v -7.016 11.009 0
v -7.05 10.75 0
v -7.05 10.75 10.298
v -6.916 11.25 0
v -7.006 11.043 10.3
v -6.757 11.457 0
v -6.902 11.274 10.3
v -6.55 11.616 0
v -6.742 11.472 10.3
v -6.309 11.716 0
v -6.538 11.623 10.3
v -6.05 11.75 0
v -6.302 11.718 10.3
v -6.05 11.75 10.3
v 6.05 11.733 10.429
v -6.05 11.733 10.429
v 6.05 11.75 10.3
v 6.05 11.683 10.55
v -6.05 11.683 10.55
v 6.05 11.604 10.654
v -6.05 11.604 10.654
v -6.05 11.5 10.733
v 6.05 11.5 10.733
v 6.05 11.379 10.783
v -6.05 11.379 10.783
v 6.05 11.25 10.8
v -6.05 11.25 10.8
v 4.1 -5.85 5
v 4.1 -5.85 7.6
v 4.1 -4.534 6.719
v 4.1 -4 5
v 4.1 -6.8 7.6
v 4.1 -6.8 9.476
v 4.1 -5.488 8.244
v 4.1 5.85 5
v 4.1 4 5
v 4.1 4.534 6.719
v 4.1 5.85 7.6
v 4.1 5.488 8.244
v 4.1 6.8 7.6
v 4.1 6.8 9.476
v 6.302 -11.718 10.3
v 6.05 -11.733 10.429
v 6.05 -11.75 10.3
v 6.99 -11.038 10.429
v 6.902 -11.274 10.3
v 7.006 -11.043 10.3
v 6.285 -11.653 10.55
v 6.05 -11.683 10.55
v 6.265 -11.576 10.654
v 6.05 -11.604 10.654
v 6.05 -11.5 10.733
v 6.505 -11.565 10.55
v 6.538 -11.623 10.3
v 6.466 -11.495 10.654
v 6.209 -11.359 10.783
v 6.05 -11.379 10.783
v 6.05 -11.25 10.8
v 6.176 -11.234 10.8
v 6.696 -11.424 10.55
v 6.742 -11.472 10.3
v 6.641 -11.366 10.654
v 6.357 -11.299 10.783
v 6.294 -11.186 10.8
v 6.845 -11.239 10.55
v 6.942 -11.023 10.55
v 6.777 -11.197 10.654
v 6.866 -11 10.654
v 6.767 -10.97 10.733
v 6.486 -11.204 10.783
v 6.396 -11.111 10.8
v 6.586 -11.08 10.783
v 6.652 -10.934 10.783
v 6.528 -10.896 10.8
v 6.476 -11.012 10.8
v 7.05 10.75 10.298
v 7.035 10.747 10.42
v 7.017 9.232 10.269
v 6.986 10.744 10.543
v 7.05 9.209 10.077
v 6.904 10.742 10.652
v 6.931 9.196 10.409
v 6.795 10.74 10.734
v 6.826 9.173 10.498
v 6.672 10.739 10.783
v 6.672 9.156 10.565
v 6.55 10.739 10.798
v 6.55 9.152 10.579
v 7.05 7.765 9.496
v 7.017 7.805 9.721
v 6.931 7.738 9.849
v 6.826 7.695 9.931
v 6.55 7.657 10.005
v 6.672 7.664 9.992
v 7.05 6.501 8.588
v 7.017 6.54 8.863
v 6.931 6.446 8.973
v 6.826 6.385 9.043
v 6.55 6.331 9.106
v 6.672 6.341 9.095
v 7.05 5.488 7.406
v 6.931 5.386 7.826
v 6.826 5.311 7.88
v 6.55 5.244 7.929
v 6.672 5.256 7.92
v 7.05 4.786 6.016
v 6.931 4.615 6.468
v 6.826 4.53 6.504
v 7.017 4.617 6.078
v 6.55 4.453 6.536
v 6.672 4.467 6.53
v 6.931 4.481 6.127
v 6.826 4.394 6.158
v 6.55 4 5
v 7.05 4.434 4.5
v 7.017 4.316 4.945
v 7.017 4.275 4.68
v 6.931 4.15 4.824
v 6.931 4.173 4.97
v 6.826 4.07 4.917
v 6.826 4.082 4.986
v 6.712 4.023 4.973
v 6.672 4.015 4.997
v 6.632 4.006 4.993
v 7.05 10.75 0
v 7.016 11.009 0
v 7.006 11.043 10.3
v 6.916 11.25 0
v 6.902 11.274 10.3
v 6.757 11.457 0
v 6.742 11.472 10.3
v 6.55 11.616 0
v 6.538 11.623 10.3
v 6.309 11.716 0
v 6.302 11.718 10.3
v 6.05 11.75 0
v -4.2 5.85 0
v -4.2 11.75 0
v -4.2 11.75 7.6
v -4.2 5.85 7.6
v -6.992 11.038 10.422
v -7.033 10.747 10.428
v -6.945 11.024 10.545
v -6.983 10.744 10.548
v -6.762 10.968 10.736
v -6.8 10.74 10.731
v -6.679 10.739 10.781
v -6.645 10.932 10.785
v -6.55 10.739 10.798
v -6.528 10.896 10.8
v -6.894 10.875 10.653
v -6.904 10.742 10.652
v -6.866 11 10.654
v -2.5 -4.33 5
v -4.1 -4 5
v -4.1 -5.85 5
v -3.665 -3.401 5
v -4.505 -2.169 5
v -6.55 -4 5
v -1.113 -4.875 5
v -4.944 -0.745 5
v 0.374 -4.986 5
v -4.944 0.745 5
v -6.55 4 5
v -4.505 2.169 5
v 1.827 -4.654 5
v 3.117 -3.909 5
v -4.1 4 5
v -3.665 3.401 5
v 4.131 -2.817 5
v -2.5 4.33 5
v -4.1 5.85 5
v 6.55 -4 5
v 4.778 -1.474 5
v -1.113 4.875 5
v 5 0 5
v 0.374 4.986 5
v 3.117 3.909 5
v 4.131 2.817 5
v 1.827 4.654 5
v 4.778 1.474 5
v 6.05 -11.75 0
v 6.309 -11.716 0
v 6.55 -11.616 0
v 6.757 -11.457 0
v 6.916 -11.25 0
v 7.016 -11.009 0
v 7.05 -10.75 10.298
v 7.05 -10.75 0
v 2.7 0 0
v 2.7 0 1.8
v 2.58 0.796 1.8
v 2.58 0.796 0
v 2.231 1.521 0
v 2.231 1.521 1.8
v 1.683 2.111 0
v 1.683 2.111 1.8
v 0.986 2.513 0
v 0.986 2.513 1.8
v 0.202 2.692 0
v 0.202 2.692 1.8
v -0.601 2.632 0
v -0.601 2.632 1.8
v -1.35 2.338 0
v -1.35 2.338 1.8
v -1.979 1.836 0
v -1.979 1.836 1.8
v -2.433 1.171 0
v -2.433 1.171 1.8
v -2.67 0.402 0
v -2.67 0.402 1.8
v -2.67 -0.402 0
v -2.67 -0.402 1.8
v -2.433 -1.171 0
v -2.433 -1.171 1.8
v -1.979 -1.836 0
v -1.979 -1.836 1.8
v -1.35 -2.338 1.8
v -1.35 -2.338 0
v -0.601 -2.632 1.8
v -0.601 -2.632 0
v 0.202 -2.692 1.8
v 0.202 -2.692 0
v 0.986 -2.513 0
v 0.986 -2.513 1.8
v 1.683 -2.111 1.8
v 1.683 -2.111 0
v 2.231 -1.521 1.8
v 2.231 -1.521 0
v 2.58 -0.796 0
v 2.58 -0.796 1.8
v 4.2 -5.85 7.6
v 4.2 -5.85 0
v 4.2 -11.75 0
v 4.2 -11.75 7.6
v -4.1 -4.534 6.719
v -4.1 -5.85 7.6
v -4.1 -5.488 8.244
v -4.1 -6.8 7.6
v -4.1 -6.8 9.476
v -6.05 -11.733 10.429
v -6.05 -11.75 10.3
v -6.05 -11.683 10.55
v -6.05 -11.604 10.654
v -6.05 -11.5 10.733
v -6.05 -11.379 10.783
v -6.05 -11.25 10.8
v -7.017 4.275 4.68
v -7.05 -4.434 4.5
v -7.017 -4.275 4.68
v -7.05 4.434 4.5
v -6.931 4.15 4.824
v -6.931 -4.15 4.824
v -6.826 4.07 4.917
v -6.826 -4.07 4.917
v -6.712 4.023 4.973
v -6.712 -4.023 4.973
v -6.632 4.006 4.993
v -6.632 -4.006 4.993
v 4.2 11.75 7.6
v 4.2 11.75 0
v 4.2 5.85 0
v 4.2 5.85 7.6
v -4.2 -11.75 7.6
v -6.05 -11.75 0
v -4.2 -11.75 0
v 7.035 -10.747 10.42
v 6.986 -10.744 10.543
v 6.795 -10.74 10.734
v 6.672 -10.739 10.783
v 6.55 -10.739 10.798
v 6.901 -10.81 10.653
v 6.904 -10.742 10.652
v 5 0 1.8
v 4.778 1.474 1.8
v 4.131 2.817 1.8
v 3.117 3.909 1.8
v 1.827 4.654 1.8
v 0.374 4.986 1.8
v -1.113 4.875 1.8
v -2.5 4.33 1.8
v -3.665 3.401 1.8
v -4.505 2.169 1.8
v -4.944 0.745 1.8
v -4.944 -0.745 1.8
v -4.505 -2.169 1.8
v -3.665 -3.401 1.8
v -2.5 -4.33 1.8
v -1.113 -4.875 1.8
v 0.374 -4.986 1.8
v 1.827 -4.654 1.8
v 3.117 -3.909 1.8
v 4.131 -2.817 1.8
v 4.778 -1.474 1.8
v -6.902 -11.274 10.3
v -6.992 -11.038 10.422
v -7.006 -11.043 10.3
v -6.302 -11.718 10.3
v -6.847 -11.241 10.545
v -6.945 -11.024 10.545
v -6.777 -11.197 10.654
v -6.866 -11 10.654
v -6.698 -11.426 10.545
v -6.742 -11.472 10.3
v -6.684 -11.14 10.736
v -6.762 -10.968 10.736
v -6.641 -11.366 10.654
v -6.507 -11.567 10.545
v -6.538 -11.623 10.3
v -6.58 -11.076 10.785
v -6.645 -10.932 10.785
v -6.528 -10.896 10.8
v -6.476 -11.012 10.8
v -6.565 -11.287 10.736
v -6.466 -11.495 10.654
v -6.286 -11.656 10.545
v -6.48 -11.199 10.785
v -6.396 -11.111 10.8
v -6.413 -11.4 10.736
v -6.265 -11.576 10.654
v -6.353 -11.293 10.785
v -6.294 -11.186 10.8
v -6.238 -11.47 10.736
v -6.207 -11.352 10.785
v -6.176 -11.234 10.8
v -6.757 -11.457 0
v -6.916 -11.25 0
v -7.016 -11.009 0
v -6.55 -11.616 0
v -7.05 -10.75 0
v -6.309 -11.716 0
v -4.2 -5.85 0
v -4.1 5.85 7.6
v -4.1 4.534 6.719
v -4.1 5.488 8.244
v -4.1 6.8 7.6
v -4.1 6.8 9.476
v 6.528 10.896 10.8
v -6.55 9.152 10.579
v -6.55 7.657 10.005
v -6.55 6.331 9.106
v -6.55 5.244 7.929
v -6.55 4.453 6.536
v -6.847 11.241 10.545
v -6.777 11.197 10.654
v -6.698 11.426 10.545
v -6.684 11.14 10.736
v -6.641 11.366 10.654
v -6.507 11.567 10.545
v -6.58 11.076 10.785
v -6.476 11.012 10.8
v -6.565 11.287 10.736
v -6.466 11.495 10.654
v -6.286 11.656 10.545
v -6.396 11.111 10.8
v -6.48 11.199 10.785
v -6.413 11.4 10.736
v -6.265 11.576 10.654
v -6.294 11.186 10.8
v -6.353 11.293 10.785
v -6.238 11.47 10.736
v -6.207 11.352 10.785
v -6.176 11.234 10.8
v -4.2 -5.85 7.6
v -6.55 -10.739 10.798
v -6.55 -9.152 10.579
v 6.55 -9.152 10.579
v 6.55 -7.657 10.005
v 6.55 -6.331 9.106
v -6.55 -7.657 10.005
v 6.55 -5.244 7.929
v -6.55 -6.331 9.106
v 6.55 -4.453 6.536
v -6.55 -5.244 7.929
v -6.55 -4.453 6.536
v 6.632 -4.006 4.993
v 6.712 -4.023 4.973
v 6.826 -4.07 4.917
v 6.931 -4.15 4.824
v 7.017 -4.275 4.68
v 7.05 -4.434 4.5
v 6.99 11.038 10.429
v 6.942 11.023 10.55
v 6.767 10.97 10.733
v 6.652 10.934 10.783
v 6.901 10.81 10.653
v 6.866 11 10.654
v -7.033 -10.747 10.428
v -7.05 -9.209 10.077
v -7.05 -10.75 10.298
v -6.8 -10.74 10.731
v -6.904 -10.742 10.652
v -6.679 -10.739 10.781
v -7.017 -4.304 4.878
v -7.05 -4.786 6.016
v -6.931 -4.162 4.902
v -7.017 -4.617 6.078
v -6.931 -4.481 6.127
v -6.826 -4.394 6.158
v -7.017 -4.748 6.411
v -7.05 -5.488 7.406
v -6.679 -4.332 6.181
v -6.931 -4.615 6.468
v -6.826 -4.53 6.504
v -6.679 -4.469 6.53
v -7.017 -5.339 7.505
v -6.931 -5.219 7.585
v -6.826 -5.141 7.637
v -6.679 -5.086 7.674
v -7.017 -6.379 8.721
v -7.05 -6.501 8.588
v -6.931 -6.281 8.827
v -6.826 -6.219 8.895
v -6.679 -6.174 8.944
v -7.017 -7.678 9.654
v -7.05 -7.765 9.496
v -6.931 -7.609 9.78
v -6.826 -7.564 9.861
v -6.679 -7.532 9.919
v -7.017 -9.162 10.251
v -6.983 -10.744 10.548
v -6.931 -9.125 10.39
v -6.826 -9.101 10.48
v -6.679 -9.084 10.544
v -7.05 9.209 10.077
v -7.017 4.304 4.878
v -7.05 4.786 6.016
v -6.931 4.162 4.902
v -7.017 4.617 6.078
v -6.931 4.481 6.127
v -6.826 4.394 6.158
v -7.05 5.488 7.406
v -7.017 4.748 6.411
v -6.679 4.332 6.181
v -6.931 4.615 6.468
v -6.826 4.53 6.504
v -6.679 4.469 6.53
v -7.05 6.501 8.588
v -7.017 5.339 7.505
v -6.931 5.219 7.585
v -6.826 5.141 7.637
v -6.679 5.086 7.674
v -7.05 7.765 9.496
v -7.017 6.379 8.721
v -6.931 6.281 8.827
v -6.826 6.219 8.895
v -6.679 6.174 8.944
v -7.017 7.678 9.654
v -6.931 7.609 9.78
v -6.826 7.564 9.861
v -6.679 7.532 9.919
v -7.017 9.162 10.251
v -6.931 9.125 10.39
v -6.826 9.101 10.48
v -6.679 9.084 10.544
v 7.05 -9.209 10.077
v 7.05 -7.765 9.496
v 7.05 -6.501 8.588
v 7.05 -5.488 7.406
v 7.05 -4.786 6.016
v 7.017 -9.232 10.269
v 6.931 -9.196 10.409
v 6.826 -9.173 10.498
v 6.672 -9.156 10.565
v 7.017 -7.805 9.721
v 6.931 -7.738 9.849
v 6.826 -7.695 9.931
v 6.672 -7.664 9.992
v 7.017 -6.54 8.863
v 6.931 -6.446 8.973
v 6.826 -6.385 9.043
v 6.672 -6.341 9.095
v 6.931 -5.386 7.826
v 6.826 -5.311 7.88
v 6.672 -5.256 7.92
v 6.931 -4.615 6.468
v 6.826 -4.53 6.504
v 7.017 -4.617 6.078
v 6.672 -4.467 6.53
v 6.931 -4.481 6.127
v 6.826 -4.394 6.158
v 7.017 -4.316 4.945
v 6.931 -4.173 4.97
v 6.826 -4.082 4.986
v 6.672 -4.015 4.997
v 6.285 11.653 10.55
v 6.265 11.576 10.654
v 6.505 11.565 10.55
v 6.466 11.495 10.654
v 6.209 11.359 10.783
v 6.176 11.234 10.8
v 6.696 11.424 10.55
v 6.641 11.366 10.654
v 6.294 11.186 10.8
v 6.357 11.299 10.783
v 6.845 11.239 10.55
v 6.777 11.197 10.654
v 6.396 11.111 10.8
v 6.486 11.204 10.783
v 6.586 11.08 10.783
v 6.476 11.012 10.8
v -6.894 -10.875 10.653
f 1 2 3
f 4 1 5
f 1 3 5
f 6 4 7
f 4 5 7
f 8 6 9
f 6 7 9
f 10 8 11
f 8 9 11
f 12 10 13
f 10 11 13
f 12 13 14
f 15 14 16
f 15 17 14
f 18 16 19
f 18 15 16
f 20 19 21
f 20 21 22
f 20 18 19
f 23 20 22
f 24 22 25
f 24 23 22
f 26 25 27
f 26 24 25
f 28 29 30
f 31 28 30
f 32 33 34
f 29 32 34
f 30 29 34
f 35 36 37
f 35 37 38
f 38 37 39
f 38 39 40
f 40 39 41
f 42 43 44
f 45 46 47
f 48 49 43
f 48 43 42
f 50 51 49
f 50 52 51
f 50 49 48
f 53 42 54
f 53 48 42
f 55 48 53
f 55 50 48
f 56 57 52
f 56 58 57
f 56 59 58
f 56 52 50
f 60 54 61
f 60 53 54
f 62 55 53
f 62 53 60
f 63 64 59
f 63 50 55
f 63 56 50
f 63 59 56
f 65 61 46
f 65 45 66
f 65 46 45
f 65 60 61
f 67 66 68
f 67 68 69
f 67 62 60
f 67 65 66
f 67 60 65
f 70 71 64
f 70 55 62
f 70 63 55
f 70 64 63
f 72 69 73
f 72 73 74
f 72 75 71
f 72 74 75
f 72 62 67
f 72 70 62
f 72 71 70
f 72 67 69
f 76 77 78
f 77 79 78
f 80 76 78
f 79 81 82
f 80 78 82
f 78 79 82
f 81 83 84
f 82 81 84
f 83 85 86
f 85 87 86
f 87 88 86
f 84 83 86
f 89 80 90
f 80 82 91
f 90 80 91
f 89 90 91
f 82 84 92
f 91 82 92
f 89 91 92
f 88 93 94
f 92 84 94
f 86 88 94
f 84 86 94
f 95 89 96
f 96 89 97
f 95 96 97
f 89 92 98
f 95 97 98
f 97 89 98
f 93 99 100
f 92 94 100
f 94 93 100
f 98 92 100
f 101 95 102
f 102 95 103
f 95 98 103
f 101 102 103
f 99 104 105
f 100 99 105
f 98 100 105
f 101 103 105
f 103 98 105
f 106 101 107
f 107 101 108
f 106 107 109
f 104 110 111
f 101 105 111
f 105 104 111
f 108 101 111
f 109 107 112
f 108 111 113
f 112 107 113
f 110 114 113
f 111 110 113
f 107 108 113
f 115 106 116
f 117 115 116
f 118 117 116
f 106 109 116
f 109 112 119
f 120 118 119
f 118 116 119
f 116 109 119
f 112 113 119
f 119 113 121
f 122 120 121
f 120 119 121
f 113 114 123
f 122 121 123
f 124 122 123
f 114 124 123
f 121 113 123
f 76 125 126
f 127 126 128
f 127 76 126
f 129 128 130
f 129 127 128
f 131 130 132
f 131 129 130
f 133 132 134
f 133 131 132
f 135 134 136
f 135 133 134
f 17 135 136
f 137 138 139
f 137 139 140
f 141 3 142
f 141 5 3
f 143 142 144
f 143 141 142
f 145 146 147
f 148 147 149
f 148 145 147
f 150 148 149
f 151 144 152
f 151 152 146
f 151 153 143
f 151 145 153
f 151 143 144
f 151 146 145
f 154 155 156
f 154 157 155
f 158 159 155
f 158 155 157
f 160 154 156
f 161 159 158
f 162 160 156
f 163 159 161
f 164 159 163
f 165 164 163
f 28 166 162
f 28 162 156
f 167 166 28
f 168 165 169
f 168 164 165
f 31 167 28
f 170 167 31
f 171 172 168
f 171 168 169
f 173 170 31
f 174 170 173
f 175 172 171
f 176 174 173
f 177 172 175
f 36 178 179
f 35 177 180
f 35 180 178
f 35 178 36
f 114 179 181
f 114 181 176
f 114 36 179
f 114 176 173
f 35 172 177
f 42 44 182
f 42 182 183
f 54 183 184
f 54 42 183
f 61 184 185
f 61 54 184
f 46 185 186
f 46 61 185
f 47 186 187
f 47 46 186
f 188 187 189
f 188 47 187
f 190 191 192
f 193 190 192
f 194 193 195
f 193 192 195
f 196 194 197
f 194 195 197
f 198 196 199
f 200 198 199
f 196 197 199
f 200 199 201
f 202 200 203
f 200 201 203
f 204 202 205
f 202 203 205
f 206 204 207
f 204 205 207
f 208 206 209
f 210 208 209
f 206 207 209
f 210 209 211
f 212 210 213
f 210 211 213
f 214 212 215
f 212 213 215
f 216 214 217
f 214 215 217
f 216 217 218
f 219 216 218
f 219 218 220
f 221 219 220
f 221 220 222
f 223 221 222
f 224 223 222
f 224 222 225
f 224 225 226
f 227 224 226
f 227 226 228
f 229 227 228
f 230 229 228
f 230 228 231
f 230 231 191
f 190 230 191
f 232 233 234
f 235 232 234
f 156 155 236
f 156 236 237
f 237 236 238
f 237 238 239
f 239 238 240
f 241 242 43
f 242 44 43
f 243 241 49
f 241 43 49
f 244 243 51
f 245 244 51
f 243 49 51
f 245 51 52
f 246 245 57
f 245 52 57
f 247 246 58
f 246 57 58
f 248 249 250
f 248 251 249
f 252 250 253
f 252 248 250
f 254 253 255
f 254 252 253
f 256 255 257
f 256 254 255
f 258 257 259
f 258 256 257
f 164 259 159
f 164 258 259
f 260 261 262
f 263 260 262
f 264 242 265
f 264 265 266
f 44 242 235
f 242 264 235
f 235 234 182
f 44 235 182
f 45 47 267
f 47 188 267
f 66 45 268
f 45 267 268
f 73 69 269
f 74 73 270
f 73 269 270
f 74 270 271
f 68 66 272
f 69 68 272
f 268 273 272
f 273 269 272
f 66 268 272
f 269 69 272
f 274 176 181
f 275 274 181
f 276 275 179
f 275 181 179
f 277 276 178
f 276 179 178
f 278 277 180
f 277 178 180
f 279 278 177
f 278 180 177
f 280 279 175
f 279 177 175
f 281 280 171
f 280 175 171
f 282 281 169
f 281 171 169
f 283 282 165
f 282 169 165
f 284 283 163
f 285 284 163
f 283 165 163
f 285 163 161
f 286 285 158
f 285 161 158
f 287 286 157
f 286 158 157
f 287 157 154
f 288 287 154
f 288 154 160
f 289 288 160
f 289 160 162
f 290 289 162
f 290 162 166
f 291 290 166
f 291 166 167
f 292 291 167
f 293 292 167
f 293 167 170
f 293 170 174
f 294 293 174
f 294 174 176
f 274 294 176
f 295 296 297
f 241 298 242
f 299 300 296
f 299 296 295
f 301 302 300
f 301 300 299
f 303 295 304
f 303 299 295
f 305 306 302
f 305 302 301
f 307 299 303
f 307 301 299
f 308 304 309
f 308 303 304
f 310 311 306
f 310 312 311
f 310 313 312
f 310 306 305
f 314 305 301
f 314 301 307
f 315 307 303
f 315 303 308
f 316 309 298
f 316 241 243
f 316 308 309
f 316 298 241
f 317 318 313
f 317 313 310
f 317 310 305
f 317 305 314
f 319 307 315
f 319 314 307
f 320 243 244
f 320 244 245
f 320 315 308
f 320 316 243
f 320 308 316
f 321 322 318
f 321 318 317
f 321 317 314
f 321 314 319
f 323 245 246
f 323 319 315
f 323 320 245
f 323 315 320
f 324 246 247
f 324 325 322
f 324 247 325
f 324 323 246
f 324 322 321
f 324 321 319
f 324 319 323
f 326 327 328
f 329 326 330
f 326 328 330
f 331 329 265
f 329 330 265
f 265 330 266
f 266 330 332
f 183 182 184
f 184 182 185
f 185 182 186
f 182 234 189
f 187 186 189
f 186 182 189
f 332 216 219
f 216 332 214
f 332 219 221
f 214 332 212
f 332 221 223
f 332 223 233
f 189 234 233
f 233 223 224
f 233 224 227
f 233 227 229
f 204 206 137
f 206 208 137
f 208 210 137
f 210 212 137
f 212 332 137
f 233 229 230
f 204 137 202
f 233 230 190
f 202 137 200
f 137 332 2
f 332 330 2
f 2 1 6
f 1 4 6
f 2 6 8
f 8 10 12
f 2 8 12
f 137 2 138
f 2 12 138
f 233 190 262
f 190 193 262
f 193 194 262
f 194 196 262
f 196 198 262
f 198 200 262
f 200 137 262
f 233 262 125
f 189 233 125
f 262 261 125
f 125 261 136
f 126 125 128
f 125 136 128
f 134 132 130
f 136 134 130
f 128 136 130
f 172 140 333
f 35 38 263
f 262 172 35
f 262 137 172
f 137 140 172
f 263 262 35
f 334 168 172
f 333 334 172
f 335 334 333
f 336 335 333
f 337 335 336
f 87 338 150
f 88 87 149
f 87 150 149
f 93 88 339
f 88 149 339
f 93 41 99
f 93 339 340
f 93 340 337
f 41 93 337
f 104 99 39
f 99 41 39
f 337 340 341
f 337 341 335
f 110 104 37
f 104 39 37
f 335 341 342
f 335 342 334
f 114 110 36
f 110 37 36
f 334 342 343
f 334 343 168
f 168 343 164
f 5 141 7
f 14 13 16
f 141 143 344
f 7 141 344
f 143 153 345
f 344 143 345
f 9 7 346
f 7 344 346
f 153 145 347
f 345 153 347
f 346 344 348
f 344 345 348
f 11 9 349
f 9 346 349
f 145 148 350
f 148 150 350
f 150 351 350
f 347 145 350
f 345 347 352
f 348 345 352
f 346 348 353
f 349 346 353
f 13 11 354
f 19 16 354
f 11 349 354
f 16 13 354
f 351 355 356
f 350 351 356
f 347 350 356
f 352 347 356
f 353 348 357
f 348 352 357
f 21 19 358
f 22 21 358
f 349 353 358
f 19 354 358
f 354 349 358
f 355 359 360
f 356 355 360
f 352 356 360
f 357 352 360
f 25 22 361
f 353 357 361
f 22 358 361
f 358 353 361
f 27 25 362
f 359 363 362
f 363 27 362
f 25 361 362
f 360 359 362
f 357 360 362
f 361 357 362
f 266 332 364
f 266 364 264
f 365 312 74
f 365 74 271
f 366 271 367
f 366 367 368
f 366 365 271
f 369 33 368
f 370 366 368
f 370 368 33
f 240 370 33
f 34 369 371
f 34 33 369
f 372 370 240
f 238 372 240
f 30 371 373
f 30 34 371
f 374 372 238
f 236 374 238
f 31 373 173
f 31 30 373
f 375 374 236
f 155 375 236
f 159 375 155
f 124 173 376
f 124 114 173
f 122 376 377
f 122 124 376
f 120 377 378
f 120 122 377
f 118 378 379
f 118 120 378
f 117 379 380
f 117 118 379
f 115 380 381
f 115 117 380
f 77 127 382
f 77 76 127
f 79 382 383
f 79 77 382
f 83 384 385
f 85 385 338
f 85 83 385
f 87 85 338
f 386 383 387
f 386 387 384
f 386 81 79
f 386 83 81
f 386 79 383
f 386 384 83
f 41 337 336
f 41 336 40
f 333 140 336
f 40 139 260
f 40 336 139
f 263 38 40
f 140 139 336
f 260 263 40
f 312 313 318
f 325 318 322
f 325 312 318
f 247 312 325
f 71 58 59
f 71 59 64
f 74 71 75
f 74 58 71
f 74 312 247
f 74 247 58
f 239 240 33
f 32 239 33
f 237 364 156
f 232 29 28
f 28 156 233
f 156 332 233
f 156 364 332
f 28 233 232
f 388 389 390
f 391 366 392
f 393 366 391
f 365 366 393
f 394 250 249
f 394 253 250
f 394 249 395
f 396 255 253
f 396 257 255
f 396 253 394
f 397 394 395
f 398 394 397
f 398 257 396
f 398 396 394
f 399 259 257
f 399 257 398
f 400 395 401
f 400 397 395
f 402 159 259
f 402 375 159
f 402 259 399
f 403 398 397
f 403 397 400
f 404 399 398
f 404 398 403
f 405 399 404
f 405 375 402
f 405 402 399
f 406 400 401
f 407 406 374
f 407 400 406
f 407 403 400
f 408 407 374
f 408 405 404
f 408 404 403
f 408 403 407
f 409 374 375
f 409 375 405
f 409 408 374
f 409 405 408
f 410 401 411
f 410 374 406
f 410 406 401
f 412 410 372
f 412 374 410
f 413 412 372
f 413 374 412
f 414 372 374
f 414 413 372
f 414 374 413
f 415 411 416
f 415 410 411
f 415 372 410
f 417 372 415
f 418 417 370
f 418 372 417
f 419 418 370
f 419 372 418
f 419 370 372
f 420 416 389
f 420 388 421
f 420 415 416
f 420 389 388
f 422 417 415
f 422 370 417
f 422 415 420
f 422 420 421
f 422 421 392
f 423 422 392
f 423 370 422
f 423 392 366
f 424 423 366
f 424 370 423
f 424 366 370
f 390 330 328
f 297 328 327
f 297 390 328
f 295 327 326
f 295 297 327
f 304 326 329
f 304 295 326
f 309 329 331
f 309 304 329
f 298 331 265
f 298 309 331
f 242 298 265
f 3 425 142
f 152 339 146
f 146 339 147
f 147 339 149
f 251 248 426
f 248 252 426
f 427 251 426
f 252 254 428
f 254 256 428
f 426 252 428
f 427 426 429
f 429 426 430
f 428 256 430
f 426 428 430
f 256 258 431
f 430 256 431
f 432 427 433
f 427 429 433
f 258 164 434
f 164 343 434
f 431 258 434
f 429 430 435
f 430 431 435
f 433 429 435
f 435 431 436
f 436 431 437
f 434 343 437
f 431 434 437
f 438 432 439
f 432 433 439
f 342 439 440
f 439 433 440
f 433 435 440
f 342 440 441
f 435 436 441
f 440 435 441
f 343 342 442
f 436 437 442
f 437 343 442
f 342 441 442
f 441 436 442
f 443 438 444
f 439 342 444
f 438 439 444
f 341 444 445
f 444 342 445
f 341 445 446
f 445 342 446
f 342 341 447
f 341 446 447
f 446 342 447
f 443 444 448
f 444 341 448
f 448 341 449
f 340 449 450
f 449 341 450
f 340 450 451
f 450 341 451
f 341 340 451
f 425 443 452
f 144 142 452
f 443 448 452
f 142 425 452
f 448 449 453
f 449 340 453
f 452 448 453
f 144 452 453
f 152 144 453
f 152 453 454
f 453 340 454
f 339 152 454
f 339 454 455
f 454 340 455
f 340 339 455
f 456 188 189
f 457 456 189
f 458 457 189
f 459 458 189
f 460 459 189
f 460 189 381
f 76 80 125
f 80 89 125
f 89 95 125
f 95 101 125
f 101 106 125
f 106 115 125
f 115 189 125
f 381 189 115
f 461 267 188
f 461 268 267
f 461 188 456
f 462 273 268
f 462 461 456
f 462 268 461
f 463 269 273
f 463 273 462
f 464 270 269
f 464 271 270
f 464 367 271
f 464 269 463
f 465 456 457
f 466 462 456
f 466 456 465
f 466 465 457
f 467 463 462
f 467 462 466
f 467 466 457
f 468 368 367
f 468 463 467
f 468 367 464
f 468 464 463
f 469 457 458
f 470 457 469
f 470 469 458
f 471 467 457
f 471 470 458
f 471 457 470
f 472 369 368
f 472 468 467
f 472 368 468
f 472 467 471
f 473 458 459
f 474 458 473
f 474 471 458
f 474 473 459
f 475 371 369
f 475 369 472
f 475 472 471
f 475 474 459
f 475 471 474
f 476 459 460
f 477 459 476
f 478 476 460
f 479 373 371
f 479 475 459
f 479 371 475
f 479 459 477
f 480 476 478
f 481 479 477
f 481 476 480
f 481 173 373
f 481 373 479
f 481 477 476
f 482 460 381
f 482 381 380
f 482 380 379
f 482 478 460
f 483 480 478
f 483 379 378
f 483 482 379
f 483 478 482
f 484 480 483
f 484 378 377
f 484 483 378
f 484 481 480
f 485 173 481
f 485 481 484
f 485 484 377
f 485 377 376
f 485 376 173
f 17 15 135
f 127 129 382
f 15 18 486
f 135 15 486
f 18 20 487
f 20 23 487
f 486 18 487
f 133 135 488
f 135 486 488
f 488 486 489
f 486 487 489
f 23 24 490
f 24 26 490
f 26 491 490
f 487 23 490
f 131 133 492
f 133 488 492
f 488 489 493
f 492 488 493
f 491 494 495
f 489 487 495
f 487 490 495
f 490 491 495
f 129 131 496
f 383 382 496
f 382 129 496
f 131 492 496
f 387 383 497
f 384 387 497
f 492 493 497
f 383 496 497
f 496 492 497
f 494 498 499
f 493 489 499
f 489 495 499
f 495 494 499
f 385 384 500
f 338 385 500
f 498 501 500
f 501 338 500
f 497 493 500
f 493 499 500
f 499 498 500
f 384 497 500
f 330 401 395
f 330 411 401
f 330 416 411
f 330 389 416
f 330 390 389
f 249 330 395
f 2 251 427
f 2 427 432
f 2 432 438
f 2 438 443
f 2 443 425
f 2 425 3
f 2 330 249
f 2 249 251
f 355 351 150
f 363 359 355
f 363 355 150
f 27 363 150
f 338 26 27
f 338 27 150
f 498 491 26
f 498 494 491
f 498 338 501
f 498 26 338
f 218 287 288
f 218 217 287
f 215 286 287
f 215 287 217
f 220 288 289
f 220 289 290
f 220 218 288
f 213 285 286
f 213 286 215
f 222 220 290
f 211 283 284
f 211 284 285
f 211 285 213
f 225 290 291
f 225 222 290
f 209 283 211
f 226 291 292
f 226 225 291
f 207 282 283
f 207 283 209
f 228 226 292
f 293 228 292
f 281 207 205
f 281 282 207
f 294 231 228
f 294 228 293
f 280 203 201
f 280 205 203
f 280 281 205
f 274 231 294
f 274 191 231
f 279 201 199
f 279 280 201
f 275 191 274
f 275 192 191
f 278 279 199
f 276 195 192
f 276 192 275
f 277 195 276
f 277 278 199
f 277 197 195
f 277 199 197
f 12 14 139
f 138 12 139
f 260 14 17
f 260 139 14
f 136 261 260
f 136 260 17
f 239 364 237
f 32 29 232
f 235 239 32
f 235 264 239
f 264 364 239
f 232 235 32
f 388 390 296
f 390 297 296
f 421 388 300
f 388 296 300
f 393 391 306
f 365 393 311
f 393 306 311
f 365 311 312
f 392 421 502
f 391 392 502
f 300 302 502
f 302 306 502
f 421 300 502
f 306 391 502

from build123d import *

# Parameters (mm, degrees)
F0_W         = 14.1
F0_H         = 23.5
F1_DEPTH     = 10.8
F2_W         = 8.2
F2_H         = 2.8
F2_H_2       = 8
F2_W_2       = 2.95
F3_DEPTH     = 5.8
F4_W         = 8.4
F4_H         = 5.9
F5_DEPTH     = 7.6
F6_R         = 5
F7_DEPTH     = 3.2
F8_R         = 2.7
F9_DEPTH     = 1.801
F10_T1_DEPTH = 37.4318792991
F11_R        = 1
F12_R        = 0.5


# Not quite as in the source:
# - a fillet or chamfer that OpenCascade refuses, or shapes differently, is made with other operations: its cross-section is extruded or revolved along the edge and cut away or added


with BuildPart() as f1:
    # F0 (on Top) → F1 (new body)
    with BuildSketch(Plane.XY):
        Rectangle(F0_W, F0_H)
    extrude(amount=F1_DEPTH)

    # F2 (on face) → F3 (cut)
    with BuildSketch(Plane.XY.offset(10.8)):
        with Locations((0, -5.4)):
            Rectangle(F2_W, F2_H)
        Rectangle(F2_W, F2_H_2)
        with Locations((5.575, 0)):
            Rectangle(F2_W_2, F2_H_2)
        with Locations((-5.575, 0)):
            Rectangle(F2_W_2, F2_H_2)
        with Locations((0, 5.4)):
            Rectangle(F2_W, F2_H)
    extrude(amount=-F3_DEPTH, mode=Mode.SUBTRACT)

    # F4 (on face) → F5 (cut)
    with BuildSketch(Plane(origin=(0, 0, 0), x_dir=(1, 0, 0), z_dir=(0, 0, -1))):
        with Locations((0, -8.8)):
            Rectangle(F4_W, F4_H)
        with Locations((0, 8.8)):
            Rectangle(F4_W, F4_H)
    extrude(amount=-F5_DEPTH, mode=Mode.SUBTRACT)

    # F6 (on face) → F7 (cut)
    with BuildSketch(Plane.XY.offset(5)):
        Circle(F6_R)
    extrude(amount=-F7_DEPTH, mode=Mode.SUBTRACT)

    # F8 (on face) → F9 (cut, through all)
    with BuildSketch(Plane.XY.offset(1.8)):
        Circle(F8_R)
    extrude(amount=-F9_DEPTH, mode=Mode.SUBTRACT)

    # F10: fillet of radius 7 on 2 edges, made by hand

    # F10_s2 → F10_t1 (cut)
    with BuildSketch(Plane.YZ.offset(-24.2909396496)):
        with BuildLine():
            ThreePointArc((-10.8963758598, 10.8), (-6.3908237294, 9.1572380944), (-4, 5))
            Line((-4, 5), (-4, 10.8))
            Line((-4, 10.8), (-10.8963758598, 10.8))
        make_face()
        with BuildLine():
            ThreePointArc((10.8963758598, 10.8), (6.3908237294, 9.1572380944), (4, 5))
            Line((4, 5), (4, 10.8))
            Line((4, 10.8), (10.8963758598, 10.8))
        make_face()
    extrude(amount=F10_T1_DEPTH, mode=Mode.SUBTRACT)

    # F11
    f11_edges = [f1.edges().sort_by_distance(p)[0] for p in [
        (7.05, -11.75, 5.4),
        (-7.05, -11.75, 5.4),
        (7.05, 11.75, 5.4),
        (-7.05, 11.75, 5.4),
    ]]
    fillet(f11_edges, radius=F11_R)

    # F12
    f12_edges = [f1.edges().sort_by_distance(p)[0] for p in [
        (0, 11.75, 10.8),
        (0, -11.75, 10.8),
        (-7.05, 0, 5),
        (7.05, 0, 5),
        (7.05, -6.335055, 9.109835),
        (7.05, 6.335055, 9.109835),
        (7.047304, -10.823382, 10.79962),
        (6.703309, -11.507092, 10.8),
        (7.047304, 10.823382, 10.79962),
        (6.703309, 11.507092, 10.8),
        (-7.05, -6.335055, 9.109835),
        (-7.047304, -10.823382, 10.799619),
        (-7.05, 6.335055, 9.109835),
        (-7.047304, 10.823382, 10.79962),
        (-6.703309, -11.507092, 10.8),
        (-6.703309, 11.507092, 10.8),
    ]]
    fillet(f12_edges, radius=F12_R)


solid = f1.part
